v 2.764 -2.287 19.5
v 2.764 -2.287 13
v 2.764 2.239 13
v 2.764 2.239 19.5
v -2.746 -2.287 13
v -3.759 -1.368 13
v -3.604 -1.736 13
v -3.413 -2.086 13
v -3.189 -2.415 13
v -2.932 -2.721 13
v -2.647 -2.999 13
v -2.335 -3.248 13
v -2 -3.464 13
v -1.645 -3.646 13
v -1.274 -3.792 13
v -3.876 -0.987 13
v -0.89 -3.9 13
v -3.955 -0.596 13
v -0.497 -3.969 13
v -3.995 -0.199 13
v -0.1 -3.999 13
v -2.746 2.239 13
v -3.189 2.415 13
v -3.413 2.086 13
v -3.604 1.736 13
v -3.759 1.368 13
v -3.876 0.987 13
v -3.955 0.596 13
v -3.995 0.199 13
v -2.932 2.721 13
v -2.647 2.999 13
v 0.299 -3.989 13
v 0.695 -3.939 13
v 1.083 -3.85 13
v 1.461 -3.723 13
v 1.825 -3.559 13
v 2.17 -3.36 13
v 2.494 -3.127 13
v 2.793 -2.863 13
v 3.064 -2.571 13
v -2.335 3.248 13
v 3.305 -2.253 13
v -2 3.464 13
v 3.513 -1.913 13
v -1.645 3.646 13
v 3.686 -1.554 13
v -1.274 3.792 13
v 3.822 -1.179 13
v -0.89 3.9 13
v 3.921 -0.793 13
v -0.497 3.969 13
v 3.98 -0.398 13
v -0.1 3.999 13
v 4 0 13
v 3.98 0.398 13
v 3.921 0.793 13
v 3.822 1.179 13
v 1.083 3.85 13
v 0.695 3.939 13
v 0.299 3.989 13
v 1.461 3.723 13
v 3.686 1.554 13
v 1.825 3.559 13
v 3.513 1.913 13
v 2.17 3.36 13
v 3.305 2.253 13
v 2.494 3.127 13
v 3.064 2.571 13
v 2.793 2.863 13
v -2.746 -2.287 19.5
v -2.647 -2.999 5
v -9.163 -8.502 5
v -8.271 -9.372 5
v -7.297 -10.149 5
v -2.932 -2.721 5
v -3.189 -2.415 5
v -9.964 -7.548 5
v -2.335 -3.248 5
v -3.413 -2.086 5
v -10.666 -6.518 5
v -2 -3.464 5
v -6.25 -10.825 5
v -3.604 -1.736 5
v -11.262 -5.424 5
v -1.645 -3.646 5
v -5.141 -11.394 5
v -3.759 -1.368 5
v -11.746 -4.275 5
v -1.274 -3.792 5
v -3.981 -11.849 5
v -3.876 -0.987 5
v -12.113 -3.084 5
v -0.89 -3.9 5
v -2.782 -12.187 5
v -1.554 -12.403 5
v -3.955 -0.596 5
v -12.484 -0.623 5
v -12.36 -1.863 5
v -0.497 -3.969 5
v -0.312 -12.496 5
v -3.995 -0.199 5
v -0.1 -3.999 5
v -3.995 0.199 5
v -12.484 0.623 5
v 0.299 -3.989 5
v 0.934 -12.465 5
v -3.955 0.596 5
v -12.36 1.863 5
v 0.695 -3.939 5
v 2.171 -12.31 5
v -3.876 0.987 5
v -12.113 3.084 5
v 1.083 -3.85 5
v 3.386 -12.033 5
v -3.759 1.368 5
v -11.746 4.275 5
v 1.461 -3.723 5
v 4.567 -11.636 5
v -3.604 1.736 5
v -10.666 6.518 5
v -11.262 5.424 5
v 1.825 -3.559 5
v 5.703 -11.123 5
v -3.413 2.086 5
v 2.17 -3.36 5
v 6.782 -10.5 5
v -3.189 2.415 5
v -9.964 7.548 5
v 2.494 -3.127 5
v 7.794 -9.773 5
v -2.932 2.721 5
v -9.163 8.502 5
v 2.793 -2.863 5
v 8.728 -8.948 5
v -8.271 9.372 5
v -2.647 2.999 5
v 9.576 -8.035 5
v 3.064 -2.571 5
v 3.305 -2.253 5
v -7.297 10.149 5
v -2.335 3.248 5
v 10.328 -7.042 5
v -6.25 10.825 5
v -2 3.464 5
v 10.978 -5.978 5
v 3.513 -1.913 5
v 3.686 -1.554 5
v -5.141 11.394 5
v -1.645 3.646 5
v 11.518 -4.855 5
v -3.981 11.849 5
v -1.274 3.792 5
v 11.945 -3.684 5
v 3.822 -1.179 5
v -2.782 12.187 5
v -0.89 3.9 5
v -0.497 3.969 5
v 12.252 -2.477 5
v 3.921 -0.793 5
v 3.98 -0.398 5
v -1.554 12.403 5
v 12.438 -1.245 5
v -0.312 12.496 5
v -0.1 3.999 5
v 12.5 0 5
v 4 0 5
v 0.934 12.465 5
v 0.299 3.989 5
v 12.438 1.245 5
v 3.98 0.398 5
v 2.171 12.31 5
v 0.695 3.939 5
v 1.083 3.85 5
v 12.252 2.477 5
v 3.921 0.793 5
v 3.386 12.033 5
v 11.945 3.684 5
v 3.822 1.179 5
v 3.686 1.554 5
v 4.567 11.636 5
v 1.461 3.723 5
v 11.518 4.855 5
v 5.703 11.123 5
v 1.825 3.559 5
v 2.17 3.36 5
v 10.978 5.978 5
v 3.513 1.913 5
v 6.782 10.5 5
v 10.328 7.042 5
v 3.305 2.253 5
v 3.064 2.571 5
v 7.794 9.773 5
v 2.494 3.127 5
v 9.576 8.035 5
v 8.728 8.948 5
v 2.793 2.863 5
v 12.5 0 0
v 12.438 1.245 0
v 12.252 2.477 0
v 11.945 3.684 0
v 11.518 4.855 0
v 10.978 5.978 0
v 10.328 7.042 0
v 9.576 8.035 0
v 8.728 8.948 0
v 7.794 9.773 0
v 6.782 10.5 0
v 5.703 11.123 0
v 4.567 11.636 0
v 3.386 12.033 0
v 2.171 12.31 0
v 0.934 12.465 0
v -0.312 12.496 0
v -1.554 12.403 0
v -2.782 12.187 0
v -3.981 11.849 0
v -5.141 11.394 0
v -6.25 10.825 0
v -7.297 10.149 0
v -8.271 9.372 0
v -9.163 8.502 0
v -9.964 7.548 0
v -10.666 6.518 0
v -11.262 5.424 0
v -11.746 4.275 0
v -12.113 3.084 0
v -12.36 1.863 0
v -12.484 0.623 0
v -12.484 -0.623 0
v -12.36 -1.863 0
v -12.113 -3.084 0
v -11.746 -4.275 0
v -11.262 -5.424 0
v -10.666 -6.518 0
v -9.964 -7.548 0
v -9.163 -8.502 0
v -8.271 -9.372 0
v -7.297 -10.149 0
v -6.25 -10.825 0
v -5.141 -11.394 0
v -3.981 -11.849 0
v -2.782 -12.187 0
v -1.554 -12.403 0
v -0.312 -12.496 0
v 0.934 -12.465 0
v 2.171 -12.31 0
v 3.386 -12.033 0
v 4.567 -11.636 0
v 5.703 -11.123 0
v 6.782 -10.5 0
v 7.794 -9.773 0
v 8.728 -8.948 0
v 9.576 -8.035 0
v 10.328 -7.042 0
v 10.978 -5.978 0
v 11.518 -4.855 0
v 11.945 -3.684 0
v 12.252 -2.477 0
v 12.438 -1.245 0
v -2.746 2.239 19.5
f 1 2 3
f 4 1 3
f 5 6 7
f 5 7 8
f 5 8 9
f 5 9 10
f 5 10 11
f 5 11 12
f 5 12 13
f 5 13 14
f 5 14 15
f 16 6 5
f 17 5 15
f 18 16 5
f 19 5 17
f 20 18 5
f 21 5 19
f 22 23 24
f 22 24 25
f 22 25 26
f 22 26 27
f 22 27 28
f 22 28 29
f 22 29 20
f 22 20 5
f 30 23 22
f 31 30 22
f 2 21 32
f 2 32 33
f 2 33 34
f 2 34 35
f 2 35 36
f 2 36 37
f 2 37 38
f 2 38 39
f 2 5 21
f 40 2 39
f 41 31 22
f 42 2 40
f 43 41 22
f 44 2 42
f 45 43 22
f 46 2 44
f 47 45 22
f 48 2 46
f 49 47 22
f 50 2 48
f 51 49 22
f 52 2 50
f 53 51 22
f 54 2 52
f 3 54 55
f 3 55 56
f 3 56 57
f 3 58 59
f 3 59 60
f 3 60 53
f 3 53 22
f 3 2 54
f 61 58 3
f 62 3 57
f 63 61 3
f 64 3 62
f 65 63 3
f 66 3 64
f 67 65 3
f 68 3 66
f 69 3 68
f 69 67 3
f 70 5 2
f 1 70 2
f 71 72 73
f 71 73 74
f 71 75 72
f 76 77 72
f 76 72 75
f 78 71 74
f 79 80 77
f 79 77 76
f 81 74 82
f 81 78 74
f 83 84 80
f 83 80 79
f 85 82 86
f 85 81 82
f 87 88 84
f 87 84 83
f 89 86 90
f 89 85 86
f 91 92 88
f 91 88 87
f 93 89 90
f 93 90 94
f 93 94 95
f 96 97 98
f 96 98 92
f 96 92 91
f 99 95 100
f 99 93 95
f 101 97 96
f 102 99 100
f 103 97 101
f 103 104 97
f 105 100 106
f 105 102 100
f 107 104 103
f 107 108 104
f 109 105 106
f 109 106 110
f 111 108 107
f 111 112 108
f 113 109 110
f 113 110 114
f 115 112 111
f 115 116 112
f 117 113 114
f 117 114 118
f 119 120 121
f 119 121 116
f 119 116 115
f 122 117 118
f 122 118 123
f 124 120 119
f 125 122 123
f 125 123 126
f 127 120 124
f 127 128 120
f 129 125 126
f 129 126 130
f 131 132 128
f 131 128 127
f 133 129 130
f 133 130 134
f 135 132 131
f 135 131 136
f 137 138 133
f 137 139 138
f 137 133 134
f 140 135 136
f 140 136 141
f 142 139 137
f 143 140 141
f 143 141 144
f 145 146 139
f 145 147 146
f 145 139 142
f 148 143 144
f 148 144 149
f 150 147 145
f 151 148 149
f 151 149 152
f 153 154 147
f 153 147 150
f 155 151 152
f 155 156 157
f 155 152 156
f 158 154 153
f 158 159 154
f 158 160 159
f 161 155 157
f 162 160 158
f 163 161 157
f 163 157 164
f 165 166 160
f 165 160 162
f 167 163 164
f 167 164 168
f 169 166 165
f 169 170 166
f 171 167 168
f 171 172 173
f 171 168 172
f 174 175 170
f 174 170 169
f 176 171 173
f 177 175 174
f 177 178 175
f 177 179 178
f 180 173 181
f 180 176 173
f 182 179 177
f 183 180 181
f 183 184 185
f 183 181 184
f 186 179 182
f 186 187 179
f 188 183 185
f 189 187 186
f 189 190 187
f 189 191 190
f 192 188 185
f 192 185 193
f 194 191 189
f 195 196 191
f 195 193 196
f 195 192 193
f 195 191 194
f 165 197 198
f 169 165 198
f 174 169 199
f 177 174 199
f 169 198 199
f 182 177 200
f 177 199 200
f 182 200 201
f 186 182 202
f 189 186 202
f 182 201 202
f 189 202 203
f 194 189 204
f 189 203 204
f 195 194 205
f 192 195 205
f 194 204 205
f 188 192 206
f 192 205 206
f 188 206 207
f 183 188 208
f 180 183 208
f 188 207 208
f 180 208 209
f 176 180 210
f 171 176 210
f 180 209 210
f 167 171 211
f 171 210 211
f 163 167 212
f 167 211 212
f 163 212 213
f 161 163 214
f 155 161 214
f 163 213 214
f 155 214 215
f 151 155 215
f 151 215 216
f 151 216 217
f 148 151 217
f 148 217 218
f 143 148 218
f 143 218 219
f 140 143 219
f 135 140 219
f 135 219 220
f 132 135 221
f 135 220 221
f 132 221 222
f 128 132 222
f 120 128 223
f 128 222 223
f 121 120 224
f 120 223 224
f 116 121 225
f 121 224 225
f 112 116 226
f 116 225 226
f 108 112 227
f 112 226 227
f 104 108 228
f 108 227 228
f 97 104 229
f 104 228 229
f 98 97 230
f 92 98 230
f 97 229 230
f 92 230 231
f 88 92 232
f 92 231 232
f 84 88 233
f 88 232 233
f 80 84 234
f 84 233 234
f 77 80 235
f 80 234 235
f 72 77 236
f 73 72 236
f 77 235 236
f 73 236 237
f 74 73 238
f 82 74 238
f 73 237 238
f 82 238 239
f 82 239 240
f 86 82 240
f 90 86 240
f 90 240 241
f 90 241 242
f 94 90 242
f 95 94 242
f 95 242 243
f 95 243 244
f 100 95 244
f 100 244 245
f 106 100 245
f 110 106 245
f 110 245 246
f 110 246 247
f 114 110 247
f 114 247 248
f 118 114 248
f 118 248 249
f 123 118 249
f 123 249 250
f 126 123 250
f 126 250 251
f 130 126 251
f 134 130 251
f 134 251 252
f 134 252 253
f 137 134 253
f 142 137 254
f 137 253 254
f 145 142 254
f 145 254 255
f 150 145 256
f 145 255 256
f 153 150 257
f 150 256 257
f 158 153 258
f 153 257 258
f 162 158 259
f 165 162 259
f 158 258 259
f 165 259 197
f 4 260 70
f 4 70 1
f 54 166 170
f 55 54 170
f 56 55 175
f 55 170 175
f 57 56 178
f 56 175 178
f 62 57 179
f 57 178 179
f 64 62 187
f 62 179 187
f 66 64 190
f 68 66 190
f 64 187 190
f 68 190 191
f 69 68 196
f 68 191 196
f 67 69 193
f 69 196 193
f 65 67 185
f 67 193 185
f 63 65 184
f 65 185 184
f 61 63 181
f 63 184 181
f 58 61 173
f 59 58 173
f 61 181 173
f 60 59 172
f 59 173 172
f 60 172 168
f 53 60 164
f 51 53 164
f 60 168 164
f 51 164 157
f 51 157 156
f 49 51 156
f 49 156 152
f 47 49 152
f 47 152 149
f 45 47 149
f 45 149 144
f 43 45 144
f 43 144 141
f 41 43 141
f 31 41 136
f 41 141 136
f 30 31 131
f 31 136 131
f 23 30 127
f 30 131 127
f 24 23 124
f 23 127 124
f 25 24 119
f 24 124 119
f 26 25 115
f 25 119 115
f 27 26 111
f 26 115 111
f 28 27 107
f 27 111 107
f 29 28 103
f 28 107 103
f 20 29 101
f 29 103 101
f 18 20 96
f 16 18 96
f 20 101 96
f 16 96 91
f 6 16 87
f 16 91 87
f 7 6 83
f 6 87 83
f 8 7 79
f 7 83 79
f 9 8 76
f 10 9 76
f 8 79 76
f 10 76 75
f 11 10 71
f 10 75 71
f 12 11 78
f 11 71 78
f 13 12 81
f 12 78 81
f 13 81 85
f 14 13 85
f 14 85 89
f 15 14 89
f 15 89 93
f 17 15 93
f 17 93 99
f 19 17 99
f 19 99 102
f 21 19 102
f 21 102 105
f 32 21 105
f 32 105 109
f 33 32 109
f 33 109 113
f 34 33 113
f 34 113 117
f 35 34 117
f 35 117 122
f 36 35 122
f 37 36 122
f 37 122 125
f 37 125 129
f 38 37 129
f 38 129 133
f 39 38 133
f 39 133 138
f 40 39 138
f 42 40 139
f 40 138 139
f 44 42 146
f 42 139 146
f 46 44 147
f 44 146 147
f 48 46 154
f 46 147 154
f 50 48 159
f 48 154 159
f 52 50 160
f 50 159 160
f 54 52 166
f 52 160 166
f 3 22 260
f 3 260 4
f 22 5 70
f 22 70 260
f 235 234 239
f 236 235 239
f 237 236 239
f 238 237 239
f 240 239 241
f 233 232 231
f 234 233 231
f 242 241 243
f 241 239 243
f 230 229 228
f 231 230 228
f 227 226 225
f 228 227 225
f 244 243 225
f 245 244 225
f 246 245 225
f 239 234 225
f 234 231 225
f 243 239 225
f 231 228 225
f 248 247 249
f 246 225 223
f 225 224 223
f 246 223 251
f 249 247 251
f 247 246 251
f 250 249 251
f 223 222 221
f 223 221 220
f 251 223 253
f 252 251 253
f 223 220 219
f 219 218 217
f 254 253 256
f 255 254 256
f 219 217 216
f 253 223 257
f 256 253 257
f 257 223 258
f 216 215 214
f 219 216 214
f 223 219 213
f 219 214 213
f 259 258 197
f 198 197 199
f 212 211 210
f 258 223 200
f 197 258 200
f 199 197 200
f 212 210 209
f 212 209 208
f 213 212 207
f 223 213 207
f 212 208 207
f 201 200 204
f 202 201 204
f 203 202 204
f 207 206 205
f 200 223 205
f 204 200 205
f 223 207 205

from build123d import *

# Parameters (mm, degrees)
SKETCH1_R           = 12.5
BOSS_EXTRUDE1_DEPTH = 5
SKETCH2_R           = 4
BOSS_EXTRUDE2_DEPTH = 8
SKETCH3_W           = 5.51003513
SKETCH3_H           = 4.526021733
BOSS_EXTRUDE3_DEPTH = 6.5


with BuildPart() as part:
    # Sketch1 → Boss-Extrude1 (new body)
    with BuildSketch(Plane.XY):
        Circle(SKETCH1_R)
    extrude(amount=BOSS_EXTRUDE1_DEPTH)

    # Sketch2 → Boss-Extrude2 (add)
    with BuildSketch(Plane.XY.offset(5)):
        Circle(SKETCH2_R)
    extrude(amount=BOSS_EXTRUDE2_DEPTH)

    # Sketch3 → Boss-Extrude3 (add)
    with BuildSketch(Plane.XY.offset(13)):
        with Locations((0.009307382, -0.024270034)):
            Rectangle(SKETCH3_W, SKETCH3_H)
    extrude(amount=BOSS_EXTRUDE3_DEPTH)


solid = part.part
